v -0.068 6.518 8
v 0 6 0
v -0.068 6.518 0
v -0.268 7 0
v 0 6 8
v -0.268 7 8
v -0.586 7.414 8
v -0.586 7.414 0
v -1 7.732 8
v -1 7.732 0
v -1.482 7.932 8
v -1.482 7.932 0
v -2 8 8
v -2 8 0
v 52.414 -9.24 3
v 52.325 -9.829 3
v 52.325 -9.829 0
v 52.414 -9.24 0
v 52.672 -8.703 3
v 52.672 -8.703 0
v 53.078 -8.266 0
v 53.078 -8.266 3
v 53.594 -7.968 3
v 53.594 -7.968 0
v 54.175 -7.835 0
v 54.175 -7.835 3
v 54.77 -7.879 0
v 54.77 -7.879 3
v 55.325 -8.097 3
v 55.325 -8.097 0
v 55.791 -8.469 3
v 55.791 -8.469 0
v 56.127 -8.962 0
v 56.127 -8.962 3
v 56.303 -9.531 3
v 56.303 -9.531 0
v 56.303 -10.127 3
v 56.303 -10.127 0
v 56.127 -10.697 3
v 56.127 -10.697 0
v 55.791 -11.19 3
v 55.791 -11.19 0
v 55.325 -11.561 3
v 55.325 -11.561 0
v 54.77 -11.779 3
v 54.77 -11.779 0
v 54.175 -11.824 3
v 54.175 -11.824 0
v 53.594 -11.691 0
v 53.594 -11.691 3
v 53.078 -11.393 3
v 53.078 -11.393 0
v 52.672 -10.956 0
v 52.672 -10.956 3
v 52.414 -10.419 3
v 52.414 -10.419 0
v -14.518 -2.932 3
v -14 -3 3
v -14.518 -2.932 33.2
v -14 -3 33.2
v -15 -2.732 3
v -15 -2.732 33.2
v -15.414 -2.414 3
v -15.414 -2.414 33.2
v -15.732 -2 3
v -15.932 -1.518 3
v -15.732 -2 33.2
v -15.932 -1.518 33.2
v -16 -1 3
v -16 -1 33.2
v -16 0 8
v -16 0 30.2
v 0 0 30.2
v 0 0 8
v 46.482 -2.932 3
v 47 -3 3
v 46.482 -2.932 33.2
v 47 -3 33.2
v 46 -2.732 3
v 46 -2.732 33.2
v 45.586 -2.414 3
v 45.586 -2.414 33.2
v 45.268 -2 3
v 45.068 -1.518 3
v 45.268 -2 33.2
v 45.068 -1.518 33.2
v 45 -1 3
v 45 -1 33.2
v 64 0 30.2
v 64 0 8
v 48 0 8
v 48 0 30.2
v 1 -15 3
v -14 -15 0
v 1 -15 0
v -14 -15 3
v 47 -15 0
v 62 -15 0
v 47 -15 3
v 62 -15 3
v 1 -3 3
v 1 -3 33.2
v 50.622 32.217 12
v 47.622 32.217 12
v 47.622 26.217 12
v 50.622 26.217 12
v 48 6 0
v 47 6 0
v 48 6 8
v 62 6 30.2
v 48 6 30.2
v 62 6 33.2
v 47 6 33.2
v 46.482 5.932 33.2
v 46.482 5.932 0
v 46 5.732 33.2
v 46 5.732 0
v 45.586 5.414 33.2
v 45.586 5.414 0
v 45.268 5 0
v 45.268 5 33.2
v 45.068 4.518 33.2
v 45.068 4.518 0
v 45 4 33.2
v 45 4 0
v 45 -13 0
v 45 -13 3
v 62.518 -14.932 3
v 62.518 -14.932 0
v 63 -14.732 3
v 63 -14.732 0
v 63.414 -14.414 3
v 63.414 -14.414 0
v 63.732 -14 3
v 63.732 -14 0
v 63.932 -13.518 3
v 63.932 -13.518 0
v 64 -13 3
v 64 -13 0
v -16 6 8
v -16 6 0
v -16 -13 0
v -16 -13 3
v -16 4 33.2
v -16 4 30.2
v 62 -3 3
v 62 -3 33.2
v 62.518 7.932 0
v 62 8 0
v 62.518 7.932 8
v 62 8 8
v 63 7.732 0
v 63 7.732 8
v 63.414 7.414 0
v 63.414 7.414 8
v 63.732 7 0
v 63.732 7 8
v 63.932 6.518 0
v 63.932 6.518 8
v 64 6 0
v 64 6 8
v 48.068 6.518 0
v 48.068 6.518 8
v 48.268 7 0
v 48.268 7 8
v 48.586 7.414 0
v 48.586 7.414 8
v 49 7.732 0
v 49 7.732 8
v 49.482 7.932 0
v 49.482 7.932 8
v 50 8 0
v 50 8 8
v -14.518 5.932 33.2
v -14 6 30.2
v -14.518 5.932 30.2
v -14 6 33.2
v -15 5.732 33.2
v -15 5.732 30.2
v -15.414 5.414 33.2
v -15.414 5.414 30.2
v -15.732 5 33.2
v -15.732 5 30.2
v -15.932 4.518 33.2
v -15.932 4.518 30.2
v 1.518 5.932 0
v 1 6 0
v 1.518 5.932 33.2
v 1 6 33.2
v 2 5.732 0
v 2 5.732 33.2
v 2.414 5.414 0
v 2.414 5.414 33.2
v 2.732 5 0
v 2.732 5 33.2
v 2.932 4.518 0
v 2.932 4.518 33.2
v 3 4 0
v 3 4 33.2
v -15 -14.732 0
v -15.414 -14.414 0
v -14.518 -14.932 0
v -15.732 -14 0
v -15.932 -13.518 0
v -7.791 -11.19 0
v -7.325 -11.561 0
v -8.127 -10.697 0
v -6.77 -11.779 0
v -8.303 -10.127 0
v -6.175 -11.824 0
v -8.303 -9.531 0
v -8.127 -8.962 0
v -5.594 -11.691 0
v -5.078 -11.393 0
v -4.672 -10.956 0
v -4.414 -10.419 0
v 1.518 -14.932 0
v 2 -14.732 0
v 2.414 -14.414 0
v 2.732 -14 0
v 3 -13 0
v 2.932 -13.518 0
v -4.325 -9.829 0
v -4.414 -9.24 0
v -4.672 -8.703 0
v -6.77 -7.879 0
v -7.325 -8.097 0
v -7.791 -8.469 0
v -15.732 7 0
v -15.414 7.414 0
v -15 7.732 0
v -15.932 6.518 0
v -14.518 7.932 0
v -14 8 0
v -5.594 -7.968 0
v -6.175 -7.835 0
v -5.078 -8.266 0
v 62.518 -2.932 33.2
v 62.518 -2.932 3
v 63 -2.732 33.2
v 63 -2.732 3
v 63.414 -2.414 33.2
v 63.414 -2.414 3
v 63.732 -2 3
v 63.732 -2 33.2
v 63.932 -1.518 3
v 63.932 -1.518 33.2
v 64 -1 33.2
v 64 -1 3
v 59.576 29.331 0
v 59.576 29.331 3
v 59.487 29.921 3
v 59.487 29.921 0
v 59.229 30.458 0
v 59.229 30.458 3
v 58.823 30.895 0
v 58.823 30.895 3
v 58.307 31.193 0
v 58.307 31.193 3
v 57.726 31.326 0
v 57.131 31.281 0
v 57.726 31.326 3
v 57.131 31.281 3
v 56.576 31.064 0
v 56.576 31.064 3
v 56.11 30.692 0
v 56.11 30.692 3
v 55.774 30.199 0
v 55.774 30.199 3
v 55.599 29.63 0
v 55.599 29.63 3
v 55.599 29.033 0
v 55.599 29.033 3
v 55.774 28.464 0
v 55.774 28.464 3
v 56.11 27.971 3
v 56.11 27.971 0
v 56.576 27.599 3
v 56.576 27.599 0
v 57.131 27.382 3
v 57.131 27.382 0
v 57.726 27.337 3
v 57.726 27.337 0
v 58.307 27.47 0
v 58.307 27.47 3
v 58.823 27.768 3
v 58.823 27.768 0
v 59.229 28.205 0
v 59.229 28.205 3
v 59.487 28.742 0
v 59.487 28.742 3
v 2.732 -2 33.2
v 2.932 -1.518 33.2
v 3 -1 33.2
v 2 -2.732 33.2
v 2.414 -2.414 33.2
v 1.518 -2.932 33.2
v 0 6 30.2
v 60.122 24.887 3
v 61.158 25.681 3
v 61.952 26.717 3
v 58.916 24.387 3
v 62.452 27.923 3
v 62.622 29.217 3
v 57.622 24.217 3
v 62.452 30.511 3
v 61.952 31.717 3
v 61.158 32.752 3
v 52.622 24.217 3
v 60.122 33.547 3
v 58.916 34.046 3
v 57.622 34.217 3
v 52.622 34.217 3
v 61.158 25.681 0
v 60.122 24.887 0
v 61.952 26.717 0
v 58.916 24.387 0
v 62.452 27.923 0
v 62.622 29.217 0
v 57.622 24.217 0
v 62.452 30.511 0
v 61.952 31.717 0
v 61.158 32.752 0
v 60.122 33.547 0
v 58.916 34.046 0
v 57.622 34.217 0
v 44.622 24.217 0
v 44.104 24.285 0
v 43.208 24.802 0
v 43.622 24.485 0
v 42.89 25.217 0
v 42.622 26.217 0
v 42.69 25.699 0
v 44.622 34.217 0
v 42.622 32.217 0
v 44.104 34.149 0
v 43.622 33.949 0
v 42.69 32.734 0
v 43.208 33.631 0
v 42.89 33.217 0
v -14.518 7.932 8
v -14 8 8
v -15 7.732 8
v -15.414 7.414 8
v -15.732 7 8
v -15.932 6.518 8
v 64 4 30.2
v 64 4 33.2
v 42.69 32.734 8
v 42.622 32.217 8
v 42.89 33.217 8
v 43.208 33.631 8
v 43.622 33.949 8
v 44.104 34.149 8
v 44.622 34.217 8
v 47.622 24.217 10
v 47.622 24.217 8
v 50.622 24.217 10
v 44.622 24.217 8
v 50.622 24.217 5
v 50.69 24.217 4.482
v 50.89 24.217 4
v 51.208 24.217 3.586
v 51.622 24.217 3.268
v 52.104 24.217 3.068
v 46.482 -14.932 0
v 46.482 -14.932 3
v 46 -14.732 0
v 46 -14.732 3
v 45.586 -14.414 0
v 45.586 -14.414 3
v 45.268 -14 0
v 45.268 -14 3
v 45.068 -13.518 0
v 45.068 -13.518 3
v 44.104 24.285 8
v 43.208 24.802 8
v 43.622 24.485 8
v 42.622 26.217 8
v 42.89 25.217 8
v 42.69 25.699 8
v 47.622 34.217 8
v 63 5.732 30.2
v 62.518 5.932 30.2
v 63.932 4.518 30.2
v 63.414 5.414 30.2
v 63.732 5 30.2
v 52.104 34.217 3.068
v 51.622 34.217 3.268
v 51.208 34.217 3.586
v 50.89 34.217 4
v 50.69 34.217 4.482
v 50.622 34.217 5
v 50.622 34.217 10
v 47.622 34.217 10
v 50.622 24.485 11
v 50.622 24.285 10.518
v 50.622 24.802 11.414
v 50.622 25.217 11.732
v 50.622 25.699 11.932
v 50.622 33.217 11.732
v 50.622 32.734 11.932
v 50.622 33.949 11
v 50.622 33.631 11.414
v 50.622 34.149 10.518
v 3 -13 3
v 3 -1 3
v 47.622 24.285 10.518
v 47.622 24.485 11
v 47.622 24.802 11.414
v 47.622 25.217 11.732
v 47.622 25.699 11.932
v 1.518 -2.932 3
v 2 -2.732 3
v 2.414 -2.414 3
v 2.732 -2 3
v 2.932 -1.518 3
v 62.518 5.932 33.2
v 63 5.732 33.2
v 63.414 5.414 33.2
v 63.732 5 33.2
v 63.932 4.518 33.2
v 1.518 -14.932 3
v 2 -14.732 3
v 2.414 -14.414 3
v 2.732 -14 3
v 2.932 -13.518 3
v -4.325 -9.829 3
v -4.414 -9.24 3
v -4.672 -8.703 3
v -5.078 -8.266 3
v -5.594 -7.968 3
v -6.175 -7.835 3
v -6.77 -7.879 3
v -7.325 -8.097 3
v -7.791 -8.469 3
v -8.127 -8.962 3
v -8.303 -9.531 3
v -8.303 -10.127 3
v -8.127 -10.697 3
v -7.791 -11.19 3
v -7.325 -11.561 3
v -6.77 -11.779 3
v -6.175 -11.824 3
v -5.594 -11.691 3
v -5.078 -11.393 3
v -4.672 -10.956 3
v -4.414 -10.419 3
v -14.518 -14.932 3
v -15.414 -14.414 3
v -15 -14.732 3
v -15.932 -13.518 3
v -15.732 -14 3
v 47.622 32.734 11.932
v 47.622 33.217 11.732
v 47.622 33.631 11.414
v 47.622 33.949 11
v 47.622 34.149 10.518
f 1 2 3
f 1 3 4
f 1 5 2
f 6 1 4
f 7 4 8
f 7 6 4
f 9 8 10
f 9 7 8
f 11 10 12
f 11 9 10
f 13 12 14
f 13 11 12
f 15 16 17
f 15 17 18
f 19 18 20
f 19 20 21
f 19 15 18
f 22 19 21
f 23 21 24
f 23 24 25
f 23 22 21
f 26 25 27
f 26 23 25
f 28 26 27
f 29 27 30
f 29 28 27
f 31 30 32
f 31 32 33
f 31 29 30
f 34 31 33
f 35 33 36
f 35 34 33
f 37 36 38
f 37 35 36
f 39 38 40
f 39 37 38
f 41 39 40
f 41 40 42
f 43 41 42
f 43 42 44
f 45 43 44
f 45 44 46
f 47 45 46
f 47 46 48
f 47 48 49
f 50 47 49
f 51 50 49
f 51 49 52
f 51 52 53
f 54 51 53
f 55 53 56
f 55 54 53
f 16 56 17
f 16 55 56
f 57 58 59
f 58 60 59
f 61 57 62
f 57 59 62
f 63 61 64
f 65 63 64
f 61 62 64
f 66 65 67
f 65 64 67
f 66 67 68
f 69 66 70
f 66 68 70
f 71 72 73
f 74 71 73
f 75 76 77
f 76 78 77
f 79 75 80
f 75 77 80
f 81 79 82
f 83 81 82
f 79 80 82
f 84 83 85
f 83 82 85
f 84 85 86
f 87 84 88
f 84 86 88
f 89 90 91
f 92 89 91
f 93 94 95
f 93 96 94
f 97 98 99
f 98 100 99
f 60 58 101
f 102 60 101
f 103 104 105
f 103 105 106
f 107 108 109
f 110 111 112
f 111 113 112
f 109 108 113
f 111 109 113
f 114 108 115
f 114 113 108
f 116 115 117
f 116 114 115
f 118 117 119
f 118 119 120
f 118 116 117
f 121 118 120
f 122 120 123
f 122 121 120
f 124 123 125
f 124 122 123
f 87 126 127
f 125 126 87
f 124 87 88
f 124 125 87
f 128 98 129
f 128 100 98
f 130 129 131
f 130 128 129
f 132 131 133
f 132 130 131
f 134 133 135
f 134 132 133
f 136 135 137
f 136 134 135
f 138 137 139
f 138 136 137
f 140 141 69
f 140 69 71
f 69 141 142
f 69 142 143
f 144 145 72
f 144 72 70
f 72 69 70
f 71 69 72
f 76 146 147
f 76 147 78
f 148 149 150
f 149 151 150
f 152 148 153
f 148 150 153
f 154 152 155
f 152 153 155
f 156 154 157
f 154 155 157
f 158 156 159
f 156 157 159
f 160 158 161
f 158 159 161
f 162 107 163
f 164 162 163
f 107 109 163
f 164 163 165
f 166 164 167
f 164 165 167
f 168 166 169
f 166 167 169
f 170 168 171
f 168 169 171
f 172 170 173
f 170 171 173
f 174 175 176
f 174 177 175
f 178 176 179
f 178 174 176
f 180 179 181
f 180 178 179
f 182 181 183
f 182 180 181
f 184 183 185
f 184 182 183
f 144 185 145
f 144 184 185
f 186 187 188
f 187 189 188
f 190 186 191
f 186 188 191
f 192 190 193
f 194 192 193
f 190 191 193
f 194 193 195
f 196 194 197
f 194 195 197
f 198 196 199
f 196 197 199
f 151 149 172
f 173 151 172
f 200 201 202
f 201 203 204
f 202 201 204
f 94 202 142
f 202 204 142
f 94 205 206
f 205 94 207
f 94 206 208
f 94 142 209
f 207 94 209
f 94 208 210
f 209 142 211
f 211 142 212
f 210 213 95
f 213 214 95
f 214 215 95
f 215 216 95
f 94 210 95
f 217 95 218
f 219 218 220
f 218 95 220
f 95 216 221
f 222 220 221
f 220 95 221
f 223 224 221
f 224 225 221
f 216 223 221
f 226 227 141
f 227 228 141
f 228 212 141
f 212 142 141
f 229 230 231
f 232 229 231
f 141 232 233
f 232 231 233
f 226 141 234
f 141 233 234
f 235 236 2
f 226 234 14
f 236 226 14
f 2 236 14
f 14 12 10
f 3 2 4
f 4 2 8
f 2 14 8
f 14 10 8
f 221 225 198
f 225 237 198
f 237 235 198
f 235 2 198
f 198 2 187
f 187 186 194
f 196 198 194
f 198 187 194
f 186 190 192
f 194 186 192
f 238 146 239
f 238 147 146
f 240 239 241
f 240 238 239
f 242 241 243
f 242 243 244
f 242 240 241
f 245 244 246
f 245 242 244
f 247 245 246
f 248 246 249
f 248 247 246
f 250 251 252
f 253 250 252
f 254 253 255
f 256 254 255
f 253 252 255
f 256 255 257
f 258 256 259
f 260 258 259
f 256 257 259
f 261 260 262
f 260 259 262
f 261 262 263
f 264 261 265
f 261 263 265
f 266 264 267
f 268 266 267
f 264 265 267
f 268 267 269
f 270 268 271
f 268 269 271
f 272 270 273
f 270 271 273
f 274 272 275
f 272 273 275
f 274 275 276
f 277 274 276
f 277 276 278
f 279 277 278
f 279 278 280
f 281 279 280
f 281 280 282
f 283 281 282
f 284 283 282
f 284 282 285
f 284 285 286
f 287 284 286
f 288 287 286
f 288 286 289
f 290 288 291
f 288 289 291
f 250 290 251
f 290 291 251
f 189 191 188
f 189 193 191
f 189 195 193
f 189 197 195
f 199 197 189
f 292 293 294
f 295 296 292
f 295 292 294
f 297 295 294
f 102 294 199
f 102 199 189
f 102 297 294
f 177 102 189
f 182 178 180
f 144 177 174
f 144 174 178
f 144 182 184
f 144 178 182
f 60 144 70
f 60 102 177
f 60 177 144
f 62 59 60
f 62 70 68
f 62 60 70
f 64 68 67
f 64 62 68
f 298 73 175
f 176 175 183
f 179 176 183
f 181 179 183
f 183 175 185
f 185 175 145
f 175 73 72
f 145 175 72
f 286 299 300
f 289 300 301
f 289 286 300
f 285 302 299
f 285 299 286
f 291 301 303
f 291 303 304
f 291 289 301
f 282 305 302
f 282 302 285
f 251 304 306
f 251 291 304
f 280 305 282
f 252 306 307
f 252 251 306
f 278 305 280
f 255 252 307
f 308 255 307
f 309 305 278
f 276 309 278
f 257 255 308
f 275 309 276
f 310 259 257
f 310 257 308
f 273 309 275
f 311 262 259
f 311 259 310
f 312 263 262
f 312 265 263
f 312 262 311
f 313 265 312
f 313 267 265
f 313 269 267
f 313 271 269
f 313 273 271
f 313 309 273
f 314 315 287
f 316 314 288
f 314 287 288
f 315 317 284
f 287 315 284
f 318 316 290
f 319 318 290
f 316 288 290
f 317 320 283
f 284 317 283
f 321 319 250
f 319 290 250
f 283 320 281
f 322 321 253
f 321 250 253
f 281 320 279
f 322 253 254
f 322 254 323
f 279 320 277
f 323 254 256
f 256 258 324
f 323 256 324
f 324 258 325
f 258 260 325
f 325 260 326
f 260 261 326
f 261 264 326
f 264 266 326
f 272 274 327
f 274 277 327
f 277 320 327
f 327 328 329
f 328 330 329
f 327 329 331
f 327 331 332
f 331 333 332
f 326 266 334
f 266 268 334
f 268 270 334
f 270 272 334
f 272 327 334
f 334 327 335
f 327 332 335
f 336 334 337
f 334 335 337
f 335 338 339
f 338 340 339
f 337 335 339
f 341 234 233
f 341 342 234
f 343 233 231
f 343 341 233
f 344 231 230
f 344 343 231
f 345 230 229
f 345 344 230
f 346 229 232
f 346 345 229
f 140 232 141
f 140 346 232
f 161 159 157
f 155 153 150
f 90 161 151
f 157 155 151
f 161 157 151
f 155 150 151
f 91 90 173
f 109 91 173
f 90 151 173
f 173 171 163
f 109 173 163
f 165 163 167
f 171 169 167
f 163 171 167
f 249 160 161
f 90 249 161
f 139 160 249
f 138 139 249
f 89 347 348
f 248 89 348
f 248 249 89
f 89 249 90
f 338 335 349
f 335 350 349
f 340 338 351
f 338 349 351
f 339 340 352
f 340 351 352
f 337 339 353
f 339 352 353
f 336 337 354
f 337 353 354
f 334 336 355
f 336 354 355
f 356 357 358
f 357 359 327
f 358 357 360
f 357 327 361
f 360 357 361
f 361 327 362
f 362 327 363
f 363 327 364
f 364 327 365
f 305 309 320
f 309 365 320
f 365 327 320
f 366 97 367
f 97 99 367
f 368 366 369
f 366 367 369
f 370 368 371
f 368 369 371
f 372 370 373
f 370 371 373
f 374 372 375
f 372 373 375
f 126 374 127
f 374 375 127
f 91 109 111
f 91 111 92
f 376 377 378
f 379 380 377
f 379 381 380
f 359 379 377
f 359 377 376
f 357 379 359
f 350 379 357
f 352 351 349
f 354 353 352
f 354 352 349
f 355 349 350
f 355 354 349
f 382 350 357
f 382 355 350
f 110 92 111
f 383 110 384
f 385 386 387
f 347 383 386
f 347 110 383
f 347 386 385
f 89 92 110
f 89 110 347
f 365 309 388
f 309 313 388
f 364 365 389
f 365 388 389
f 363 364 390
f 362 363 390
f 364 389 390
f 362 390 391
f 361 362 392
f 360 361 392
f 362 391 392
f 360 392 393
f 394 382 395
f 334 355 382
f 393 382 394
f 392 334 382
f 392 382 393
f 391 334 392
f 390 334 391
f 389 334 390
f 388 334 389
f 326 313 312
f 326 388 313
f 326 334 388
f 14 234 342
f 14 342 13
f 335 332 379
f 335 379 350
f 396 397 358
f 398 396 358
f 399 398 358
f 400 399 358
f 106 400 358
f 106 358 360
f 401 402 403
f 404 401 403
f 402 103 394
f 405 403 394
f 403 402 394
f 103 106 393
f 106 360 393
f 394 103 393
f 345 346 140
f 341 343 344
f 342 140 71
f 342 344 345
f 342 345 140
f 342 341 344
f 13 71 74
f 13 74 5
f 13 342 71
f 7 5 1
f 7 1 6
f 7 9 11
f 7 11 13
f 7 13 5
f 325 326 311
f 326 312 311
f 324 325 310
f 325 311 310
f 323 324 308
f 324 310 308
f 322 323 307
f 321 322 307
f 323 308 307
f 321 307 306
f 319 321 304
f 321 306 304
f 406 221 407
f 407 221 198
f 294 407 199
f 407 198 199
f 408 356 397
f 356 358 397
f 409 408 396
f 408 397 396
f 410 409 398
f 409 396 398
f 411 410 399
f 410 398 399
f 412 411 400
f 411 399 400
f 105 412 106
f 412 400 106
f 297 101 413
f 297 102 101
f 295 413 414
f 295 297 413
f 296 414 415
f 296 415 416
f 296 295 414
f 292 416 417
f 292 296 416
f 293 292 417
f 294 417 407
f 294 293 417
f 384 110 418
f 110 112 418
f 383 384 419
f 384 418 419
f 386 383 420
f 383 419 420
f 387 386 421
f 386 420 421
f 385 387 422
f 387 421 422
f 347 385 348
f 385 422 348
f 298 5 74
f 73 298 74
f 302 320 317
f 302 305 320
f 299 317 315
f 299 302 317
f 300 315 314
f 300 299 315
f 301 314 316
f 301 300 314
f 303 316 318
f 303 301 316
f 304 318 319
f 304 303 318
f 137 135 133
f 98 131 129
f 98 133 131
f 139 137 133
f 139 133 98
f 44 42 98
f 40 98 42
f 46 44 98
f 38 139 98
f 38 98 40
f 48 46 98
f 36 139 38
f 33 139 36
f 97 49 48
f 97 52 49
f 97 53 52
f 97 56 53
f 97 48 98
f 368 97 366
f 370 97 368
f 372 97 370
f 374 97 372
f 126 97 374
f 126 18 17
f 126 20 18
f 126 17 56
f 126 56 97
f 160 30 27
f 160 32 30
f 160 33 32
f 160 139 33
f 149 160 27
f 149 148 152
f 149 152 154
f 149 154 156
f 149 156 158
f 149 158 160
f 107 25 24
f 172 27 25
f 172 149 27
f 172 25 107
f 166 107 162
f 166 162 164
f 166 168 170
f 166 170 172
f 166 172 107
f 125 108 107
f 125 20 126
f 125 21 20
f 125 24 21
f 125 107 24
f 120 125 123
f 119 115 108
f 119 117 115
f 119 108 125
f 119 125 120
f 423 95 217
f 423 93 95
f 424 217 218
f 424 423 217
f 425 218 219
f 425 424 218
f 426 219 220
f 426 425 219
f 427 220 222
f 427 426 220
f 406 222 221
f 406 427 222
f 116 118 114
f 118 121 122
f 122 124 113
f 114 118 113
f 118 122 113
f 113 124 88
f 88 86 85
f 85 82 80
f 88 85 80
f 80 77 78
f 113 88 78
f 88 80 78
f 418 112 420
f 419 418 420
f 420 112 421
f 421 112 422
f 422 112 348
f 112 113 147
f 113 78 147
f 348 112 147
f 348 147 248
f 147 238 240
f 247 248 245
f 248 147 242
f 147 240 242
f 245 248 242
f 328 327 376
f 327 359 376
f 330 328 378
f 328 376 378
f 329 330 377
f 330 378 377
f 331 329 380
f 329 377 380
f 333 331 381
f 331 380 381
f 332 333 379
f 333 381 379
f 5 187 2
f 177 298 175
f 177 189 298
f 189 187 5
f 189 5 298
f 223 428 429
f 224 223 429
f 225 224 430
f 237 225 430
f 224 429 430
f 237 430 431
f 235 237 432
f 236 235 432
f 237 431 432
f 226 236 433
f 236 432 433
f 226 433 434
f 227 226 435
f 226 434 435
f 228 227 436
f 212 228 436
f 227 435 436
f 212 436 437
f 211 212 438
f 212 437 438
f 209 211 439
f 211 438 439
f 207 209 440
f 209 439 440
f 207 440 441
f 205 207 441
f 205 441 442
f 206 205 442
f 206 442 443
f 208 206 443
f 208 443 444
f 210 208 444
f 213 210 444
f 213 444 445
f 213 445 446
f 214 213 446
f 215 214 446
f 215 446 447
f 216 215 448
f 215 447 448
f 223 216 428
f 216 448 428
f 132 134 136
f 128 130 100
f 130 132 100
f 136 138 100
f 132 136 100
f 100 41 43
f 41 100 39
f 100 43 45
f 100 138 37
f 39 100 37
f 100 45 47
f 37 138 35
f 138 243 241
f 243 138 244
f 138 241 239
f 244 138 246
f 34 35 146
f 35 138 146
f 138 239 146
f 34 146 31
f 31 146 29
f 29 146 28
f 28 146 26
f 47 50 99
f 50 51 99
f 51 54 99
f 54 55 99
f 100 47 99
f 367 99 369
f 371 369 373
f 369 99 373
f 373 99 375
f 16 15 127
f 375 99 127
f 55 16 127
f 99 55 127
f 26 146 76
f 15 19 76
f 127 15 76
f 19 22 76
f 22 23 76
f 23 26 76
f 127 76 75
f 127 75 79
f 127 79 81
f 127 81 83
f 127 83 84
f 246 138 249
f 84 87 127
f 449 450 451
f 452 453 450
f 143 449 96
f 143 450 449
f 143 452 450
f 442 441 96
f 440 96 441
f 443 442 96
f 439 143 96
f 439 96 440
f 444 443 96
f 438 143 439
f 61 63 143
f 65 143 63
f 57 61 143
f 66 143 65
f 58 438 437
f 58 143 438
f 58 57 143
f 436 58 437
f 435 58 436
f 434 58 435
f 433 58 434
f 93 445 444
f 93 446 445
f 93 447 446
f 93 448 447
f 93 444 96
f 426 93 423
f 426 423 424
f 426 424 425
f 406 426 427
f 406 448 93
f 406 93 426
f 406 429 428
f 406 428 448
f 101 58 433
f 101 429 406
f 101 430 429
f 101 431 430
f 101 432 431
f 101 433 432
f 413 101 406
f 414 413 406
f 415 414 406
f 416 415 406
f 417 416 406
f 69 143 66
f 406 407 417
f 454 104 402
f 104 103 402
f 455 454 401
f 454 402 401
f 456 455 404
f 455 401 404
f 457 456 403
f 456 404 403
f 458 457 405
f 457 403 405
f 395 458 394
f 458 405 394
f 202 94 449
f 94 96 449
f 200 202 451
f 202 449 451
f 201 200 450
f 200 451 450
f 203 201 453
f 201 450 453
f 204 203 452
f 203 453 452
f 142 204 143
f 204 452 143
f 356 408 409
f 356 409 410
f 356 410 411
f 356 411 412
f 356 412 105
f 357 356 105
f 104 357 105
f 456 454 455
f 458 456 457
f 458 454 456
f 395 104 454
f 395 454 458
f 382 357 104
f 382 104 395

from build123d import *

# Parameters (mm, degrees)
F0_W      = 16
F0_H      = 8
F1_DEPTH  = 8
F2_W      = 16
F2_H      = 3
F3_DEPTH  = 33.2
F4_W      = 19
F4_H      = 3
F5_DEPTH  = 12
F6_R      = 2
F7_DEPTH  = 3
F8_W      = 16
F8_H      = 3
F9_DEPTH  = 6
F10_R     = 1.99999
F13_W     = 8
F13_H     = 10
F14_DEPTH = 8
F15_W     = 10
F15_H     = 3
F16_DEPTH = 12
F17_W     = 3
F17_H     = 10
F18_DEPTH = 4
F19_R     = 2
F20_DEPTH = 3
F21_R     = 4.99999
F22_R     = 2


# Not quite as in the source:
# - a fillet or chamfer is up to 0.001 mm smaller than in the source, because OpenCascade refuses the exact size


with BuildPart() as f1:
    # F0 (on Top) → F1 (new body)
    with BuildSketch(Plane.XY):
        with Locations((-8, 4)):
            Rectangle(F0_W, F0_H)
    extrude(amount=F1_DEPTH)

    # F2 (on Top) → F3 (join)
    with BuildSketch(Plane.XY):
        with Locations((-8, -1.5)):
            Rectangle(F2_W, F2_H)
        Polygon((0, 6), (0, 0), (0, -3), (3, -3), (3, 6), align=None)
    extrude(amount=F3_DEPTH)

    # F4 (on face) → F5 (join)
    with BuildSketch(Plane.XZ.offset(3)):
        with Locations((-6.5, 1.5)):
            Rectangle(F4_W, F4_H)
    extrude(amount=F5_DEPTH)

    # F6 (on face) → F7 (cut, through all)
    with BuildSketch(Plane.XY.offset(3)):
        with Locations((-6.3249543309, -9.8292976618)):
            Circle(F6_R)
    extrude(amount=-F7_DEPTH, mode=Mode.SUBTRACT)

    # F8 (on face) → F9 (join)
    with BuildSketch(Plane(origin=(0, 0, 0), x_dir=(-1, 0, 0), z_dir=(0, 1, 0))):
        with Locations((8, 31.7)):
            Rectangle(F8_W, F8_H)
    extrude(amount=F9_DEPTH)

    # F10 (radius 2 in the source; OpenCascade refuses exactly that, so slightly less here)
    f10_edges = [f1.edges().sort_by_distance(p)[0] for p in [
        (-16, 6, 31.7),
        (-16, 8, 4),
        (0, 8, 4),
        (3, 6, 16.6),
        (3, -15, 1.5),
        (3, -3, 18.1),
        (-16, -3, 18.1),
        (-16, -15, 1.5),
    ]]
    fillet(f10_edges, radius=F10_R)


with BuildPart() as f12_1:
    # F12: instance of F1
    add(f1.part.mirror(Plane.YZ.offset(24)))


with BuildPart() as f14:
    # F13 (on Top) → F14 (new body)
    with BuildSketch(Plane.XY):
        with Locations((46.6220968366, 29.2166761309)):
            Rectangle(F13_W, F13_H)
    extrude(amount=F14_DEPTH)

    # F15 (on face) → F16 (join)
    with BuildSketch(Plane.YZ.offset(50.6220968366)):
        with Locations((29.2166761309, 1.5)):
            Rectangle(F15_W, F15_H)
    extrude(amount=F16_DEPTH)

    # F17 (on face) → F18 (join)
    with BuildSketch(Plane.XY.offset(8)):
        with Locations((49.1220968366, 29.2166761309)):
            Rectangle(F17_W, F17_H)
    extrude(amount=F18_DEPTH)

    # F19 (on face) → F20 (cut, through all)
    with BuildSketch(Plane.XY.offset(3)):
        with Locations((57.5763136148, 29.331497848)):
            Circle(F19_R)
    extrude(amount=-F20_DEPTH, mode=Mode.SUBTRACT)

    # F21 (radius 5 in the source; OpenCascade refuses exactly that, so slightly less here)
    f21_edges = [f14.edges().sort_by_distance(p)[0] for p in [
        (62.622097, 34.216676, 1.5),
        (62.622097, 24.216676, 1.5),
    ]]
    fillet(f21_edges, radius=F21_R)

    # F22
    f22_edges = [f14.edges().sort_by_distance(p)[0] for p in [
        (50.622097, 29.216676, 3),
        (49.122097, 34.216676, 12),
        (49.122097, 24.216676, 12),
        (42.622097, 34.216676, 4),
        (42.622097, 24.216676, 4),
    ]]
    fillet(f22_edges, radius=F22_R)


solid = Compound([f1.part, f12_1.part, f14.part])
